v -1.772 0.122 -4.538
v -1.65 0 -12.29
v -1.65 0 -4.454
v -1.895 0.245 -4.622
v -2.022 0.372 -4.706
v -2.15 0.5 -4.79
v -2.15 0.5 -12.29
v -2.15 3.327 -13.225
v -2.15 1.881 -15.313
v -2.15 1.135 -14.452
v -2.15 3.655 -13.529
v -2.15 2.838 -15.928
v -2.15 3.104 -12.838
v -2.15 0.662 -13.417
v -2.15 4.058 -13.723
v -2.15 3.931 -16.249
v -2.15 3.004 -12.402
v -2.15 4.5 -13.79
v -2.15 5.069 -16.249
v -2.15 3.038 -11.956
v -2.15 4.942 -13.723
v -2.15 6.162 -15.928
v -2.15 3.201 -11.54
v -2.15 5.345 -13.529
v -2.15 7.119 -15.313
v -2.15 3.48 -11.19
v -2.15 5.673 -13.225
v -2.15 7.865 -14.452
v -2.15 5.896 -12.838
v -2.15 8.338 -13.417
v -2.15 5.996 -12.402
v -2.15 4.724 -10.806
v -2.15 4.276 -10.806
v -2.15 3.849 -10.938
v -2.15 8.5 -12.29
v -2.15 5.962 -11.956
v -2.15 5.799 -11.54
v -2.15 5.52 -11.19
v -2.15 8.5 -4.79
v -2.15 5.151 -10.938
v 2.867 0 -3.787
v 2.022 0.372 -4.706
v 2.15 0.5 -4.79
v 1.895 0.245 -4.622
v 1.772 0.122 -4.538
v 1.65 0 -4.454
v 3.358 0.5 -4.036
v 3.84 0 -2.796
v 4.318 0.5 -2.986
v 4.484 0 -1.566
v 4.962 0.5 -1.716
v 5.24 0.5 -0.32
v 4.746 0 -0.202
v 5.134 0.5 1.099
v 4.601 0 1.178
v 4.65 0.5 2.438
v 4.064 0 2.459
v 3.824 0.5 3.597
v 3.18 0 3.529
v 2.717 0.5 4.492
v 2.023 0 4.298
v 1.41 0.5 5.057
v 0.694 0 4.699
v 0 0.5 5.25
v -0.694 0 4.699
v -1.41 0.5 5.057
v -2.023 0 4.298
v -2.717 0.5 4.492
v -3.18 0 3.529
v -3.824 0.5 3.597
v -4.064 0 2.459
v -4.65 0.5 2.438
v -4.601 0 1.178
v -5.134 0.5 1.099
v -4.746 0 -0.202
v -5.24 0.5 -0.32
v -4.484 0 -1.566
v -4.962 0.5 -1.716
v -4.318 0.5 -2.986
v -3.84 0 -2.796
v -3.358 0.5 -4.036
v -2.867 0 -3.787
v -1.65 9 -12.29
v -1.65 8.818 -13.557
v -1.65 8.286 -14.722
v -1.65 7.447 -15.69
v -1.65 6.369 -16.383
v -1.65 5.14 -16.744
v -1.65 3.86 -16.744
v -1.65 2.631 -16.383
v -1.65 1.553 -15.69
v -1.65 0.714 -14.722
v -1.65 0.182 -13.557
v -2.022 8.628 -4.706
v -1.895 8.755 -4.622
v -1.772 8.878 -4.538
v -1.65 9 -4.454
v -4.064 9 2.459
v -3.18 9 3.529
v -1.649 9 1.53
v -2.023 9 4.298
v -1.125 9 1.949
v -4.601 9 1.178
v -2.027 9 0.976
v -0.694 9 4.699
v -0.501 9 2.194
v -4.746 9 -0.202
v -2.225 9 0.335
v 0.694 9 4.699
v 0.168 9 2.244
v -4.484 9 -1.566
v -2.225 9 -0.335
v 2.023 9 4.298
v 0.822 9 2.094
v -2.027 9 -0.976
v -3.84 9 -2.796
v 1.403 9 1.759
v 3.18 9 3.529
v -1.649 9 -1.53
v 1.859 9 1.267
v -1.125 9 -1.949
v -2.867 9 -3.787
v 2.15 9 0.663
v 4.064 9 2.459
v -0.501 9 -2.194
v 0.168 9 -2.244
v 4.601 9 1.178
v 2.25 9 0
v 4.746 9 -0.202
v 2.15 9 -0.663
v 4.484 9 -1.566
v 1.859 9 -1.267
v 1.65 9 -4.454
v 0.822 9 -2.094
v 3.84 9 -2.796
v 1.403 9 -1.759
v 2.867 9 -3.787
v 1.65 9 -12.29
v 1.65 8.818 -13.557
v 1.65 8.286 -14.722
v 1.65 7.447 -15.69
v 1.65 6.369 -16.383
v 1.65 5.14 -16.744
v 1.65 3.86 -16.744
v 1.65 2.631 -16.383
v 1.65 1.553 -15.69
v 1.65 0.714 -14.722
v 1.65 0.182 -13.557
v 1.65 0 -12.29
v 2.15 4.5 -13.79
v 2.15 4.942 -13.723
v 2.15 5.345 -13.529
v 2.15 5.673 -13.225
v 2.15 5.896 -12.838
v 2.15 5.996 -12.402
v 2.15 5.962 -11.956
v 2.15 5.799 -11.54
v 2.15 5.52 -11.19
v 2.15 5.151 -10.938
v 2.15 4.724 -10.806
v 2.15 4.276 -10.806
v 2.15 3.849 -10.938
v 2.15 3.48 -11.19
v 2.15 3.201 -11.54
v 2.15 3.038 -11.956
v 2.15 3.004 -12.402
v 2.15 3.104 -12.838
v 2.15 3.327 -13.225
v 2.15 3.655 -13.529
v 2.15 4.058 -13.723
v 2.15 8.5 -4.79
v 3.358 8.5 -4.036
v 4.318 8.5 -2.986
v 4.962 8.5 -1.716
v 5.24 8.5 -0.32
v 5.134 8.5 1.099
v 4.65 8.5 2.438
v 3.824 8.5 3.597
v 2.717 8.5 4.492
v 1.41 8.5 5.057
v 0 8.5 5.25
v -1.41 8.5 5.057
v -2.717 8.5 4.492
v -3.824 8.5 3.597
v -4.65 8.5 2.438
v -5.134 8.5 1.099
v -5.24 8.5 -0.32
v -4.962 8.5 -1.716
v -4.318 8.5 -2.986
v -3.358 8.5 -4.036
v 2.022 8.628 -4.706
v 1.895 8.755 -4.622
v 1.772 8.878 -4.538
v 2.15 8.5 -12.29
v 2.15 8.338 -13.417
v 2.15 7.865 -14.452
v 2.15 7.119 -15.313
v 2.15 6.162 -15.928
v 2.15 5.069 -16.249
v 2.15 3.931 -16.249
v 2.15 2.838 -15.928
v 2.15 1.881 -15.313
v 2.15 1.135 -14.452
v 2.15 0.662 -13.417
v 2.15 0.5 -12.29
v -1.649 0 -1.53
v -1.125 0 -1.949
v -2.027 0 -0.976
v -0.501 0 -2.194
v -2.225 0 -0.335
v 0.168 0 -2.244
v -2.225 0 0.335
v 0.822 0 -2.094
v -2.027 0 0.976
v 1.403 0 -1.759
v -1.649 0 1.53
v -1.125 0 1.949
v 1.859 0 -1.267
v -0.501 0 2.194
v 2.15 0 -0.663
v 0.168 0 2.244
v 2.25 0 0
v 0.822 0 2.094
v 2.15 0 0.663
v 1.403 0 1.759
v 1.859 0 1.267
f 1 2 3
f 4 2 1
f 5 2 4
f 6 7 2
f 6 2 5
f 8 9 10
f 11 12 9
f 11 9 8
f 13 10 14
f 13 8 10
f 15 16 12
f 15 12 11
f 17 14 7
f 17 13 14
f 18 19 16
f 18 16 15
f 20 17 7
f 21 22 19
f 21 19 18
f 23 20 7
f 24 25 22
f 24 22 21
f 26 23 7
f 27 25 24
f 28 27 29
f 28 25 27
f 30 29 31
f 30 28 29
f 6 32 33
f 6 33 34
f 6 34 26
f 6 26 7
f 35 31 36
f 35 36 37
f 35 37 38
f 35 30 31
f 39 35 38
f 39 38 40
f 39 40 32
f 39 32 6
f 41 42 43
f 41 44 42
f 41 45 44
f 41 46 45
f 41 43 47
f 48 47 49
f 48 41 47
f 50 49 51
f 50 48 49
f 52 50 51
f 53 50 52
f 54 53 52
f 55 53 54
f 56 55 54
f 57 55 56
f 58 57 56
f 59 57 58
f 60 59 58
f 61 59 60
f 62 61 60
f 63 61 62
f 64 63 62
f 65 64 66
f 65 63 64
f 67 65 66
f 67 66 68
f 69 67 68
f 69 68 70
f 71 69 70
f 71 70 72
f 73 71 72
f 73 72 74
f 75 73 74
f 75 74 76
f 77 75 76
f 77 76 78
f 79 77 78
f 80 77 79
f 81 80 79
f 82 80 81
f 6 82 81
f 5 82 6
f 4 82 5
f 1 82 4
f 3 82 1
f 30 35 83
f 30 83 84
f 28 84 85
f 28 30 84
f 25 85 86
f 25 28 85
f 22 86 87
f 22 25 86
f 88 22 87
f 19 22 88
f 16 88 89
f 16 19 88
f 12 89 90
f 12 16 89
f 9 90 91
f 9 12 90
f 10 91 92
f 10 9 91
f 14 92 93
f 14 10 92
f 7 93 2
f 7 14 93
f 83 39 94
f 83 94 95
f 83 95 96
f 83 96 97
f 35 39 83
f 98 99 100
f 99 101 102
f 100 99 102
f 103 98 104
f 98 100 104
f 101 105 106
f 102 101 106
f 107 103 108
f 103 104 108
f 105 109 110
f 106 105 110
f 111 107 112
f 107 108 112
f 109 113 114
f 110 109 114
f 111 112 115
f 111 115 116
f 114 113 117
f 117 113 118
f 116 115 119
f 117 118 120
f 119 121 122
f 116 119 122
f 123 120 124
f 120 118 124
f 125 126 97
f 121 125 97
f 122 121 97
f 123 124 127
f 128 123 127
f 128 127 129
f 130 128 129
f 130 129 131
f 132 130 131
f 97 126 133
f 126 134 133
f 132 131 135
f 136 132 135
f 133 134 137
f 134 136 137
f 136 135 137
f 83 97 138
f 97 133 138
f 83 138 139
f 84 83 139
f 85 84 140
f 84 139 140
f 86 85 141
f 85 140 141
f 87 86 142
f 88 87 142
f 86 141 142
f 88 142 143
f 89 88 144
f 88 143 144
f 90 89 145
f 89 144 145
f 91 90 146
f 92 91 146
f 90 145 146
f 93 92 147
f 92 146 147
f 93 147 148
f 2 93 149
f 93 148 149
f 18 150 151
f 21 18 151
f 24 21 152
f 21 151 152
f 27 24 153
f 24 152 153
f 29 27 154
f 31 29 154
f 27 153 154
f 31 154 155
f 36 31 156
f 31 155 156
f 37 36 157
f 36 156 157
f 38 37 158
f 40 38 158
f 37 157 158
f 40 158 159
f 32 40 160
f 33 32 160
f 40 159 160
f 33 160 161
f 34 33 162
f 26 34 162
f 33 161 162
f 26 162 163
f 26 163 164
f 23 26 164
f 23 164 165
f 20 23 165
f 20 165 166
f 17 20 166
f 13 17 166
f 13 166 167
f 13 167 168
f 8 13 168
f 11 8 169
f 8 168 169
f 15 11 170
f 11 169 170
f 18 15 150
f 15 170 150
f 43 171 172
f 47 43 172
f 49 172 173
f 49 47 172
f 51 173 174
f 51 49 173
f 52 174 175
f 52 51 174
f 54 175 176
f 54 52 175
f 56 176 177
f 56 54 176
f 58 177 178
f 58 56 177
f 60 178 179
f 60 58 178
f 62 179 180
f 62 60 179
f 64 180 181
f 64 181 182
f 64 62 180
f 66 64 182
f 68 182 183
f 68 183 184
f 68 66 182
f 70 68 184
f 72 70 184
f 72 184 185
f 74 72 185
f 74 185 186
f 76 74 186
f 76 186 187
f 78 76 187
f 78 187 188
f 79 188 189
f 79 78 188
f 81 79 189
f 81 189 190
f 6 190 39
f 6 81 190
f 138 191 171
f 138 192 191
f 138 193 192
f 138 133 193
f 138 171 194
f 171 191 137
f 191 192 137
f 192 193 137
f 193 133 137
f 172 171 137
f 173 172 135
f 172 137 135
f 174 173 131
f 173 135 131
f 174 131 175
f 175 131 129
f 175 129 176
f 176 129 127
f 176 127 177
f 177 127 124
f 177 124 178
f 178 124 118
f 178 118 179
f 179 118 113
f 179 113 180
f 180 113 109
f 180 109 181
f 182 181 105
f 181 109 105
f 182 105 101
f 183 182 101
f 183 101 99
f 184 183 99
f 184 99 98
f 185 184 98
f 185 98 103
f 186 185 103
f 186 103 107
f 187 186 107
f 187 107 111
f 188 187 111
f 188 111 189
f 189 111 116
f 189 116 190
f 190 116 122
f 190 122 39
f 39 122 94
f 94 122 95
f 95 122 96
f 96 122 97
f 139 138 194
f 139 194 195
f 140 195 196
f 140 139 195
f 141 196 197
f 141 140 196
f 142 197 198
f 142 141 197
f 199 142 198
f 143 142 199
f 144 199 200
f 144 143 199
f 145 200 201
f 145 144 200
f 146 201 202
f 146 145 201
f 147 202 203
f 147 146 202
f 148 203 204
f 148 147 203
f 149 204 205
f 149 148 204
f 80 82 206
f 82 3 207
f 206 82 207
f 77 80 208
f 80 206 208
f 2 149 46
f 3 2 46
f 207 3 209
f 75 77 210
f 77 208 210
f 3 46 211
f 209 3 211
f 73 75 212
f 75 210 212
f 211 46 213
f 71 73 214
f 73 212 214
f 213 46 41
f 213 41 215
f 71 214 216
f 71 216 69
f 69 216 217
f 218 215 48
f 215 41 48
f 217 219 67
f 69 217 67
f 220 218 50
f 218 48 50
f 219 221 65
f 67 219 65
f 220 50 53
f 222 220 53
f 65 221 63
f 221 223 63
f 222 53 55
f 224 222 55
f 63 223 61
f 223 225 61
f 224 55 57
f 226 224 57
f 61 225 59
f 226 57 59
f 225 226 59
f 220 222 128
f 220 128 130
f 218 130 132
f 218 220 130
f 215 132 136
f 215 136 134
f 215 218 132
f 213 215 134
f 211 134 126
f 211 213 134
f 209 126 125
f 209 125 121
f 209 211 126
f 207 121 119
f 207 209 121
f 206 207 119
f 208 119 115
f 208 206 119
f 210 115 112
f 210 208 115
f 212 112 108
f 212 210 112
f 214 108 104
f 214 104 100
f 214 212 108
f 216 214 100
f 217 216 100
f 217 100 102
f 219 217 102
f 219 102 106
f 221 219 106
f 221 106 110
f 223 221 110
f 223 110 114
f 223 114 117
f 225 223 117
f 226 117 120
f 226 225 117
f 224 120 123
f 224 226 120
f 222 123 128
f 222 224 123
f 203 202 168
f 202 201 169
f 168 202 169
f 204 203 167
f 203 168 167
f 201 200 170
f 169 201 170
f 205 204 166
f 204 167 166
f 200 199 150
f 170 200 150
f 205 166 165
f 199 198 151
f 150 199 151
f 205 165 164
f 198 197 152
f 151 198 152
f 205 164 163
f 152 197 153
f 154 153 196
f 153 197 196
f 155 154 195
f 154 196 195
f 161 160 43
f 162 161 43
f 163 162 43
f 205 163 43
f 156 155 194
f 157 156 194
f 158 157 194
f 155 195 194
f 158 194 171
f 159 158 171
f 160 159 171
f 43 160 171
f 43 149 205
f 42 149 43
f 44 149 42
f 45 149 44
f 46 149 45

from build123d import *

# Parameters (mm, degrees)
SKETCH1_R           = 2.25
SKETCH1_W           = 4.3
SKETCH1_H           = 3
BOSS_EXTRUDE1_DEPTH = 9
SKETCH3_R           = 1.5
BOSS_EXTRUDE2_DEPTH = 4.3
CHAMFER1_SIZE       = 0.5


with BuildPart() as part:
    # Sketch1 → Boss-Extrude1 (new body)
    with BuildSketch(Plane(origin=(0, 0, 0), x_dir=(1, 0, 0), z_dir=(0, 1, 0))):
        with BuildLine():
            Line((-2.15, 4.789572006), (2.15, 4.789572006))
            ThreePointArc((2.15, 4.789572006), (0, -5.25), (-2.15, 4.789572006))
        make_face()
        Circle(SKETCH1_R, mode=Mode.SUBTRACT)
        with Locations((0, 6.289572006)):
            Rectangle(SKETCH1_W, SKETCH1_H)
    extrude(amount=BOSS_EXTRUDE1_DEPTH)

    # Sketch3 → Boss-Extrude2 (add)
    with BuildSketch(Plane(origin=(2.15, 0, 0), x_dir=(0, 0, -1), z_dir=(1, 0, 0))):
        with BuildLine():
            ThreePointArc((12.289572006, 9), (16.789572006, 4.5), (12.289572006, 0))
            Line((12.289572006, 0), (7.789572006, 0))
            Line((7.789572006, 0), (7.789572006, 9))
            Line((7.789572006, 9), (12.289572006, 9))
        make_face()
        with Locations((12.289572006, 4.5)):
            Circle(SKETCH3_R, mode=Mode.SUBTRACT)
    extrude(amount=-BOSS_EXTRUDE2_DEPTH)

    # Chamfer1
    chamfer1_edges = [part.edges().sort_by_distance(p)[0] for p in [
        (0, 9, 5.25),
        (2.15, 9, -8.539572006),
        (2.15, 4.5, -16.789572006),
        (-2.15, 4.5, -16.789572006),
        (-2.15, 9, -8.539572006),
        (-2.15, 0, -8.539572006),
        (2.15, 0, -8.539572006),
        (0, 0, 5.25),
    ]]
    chamfer(chamfer1_edges, length=CHAMFER1_SIZE)


solid = part.part
